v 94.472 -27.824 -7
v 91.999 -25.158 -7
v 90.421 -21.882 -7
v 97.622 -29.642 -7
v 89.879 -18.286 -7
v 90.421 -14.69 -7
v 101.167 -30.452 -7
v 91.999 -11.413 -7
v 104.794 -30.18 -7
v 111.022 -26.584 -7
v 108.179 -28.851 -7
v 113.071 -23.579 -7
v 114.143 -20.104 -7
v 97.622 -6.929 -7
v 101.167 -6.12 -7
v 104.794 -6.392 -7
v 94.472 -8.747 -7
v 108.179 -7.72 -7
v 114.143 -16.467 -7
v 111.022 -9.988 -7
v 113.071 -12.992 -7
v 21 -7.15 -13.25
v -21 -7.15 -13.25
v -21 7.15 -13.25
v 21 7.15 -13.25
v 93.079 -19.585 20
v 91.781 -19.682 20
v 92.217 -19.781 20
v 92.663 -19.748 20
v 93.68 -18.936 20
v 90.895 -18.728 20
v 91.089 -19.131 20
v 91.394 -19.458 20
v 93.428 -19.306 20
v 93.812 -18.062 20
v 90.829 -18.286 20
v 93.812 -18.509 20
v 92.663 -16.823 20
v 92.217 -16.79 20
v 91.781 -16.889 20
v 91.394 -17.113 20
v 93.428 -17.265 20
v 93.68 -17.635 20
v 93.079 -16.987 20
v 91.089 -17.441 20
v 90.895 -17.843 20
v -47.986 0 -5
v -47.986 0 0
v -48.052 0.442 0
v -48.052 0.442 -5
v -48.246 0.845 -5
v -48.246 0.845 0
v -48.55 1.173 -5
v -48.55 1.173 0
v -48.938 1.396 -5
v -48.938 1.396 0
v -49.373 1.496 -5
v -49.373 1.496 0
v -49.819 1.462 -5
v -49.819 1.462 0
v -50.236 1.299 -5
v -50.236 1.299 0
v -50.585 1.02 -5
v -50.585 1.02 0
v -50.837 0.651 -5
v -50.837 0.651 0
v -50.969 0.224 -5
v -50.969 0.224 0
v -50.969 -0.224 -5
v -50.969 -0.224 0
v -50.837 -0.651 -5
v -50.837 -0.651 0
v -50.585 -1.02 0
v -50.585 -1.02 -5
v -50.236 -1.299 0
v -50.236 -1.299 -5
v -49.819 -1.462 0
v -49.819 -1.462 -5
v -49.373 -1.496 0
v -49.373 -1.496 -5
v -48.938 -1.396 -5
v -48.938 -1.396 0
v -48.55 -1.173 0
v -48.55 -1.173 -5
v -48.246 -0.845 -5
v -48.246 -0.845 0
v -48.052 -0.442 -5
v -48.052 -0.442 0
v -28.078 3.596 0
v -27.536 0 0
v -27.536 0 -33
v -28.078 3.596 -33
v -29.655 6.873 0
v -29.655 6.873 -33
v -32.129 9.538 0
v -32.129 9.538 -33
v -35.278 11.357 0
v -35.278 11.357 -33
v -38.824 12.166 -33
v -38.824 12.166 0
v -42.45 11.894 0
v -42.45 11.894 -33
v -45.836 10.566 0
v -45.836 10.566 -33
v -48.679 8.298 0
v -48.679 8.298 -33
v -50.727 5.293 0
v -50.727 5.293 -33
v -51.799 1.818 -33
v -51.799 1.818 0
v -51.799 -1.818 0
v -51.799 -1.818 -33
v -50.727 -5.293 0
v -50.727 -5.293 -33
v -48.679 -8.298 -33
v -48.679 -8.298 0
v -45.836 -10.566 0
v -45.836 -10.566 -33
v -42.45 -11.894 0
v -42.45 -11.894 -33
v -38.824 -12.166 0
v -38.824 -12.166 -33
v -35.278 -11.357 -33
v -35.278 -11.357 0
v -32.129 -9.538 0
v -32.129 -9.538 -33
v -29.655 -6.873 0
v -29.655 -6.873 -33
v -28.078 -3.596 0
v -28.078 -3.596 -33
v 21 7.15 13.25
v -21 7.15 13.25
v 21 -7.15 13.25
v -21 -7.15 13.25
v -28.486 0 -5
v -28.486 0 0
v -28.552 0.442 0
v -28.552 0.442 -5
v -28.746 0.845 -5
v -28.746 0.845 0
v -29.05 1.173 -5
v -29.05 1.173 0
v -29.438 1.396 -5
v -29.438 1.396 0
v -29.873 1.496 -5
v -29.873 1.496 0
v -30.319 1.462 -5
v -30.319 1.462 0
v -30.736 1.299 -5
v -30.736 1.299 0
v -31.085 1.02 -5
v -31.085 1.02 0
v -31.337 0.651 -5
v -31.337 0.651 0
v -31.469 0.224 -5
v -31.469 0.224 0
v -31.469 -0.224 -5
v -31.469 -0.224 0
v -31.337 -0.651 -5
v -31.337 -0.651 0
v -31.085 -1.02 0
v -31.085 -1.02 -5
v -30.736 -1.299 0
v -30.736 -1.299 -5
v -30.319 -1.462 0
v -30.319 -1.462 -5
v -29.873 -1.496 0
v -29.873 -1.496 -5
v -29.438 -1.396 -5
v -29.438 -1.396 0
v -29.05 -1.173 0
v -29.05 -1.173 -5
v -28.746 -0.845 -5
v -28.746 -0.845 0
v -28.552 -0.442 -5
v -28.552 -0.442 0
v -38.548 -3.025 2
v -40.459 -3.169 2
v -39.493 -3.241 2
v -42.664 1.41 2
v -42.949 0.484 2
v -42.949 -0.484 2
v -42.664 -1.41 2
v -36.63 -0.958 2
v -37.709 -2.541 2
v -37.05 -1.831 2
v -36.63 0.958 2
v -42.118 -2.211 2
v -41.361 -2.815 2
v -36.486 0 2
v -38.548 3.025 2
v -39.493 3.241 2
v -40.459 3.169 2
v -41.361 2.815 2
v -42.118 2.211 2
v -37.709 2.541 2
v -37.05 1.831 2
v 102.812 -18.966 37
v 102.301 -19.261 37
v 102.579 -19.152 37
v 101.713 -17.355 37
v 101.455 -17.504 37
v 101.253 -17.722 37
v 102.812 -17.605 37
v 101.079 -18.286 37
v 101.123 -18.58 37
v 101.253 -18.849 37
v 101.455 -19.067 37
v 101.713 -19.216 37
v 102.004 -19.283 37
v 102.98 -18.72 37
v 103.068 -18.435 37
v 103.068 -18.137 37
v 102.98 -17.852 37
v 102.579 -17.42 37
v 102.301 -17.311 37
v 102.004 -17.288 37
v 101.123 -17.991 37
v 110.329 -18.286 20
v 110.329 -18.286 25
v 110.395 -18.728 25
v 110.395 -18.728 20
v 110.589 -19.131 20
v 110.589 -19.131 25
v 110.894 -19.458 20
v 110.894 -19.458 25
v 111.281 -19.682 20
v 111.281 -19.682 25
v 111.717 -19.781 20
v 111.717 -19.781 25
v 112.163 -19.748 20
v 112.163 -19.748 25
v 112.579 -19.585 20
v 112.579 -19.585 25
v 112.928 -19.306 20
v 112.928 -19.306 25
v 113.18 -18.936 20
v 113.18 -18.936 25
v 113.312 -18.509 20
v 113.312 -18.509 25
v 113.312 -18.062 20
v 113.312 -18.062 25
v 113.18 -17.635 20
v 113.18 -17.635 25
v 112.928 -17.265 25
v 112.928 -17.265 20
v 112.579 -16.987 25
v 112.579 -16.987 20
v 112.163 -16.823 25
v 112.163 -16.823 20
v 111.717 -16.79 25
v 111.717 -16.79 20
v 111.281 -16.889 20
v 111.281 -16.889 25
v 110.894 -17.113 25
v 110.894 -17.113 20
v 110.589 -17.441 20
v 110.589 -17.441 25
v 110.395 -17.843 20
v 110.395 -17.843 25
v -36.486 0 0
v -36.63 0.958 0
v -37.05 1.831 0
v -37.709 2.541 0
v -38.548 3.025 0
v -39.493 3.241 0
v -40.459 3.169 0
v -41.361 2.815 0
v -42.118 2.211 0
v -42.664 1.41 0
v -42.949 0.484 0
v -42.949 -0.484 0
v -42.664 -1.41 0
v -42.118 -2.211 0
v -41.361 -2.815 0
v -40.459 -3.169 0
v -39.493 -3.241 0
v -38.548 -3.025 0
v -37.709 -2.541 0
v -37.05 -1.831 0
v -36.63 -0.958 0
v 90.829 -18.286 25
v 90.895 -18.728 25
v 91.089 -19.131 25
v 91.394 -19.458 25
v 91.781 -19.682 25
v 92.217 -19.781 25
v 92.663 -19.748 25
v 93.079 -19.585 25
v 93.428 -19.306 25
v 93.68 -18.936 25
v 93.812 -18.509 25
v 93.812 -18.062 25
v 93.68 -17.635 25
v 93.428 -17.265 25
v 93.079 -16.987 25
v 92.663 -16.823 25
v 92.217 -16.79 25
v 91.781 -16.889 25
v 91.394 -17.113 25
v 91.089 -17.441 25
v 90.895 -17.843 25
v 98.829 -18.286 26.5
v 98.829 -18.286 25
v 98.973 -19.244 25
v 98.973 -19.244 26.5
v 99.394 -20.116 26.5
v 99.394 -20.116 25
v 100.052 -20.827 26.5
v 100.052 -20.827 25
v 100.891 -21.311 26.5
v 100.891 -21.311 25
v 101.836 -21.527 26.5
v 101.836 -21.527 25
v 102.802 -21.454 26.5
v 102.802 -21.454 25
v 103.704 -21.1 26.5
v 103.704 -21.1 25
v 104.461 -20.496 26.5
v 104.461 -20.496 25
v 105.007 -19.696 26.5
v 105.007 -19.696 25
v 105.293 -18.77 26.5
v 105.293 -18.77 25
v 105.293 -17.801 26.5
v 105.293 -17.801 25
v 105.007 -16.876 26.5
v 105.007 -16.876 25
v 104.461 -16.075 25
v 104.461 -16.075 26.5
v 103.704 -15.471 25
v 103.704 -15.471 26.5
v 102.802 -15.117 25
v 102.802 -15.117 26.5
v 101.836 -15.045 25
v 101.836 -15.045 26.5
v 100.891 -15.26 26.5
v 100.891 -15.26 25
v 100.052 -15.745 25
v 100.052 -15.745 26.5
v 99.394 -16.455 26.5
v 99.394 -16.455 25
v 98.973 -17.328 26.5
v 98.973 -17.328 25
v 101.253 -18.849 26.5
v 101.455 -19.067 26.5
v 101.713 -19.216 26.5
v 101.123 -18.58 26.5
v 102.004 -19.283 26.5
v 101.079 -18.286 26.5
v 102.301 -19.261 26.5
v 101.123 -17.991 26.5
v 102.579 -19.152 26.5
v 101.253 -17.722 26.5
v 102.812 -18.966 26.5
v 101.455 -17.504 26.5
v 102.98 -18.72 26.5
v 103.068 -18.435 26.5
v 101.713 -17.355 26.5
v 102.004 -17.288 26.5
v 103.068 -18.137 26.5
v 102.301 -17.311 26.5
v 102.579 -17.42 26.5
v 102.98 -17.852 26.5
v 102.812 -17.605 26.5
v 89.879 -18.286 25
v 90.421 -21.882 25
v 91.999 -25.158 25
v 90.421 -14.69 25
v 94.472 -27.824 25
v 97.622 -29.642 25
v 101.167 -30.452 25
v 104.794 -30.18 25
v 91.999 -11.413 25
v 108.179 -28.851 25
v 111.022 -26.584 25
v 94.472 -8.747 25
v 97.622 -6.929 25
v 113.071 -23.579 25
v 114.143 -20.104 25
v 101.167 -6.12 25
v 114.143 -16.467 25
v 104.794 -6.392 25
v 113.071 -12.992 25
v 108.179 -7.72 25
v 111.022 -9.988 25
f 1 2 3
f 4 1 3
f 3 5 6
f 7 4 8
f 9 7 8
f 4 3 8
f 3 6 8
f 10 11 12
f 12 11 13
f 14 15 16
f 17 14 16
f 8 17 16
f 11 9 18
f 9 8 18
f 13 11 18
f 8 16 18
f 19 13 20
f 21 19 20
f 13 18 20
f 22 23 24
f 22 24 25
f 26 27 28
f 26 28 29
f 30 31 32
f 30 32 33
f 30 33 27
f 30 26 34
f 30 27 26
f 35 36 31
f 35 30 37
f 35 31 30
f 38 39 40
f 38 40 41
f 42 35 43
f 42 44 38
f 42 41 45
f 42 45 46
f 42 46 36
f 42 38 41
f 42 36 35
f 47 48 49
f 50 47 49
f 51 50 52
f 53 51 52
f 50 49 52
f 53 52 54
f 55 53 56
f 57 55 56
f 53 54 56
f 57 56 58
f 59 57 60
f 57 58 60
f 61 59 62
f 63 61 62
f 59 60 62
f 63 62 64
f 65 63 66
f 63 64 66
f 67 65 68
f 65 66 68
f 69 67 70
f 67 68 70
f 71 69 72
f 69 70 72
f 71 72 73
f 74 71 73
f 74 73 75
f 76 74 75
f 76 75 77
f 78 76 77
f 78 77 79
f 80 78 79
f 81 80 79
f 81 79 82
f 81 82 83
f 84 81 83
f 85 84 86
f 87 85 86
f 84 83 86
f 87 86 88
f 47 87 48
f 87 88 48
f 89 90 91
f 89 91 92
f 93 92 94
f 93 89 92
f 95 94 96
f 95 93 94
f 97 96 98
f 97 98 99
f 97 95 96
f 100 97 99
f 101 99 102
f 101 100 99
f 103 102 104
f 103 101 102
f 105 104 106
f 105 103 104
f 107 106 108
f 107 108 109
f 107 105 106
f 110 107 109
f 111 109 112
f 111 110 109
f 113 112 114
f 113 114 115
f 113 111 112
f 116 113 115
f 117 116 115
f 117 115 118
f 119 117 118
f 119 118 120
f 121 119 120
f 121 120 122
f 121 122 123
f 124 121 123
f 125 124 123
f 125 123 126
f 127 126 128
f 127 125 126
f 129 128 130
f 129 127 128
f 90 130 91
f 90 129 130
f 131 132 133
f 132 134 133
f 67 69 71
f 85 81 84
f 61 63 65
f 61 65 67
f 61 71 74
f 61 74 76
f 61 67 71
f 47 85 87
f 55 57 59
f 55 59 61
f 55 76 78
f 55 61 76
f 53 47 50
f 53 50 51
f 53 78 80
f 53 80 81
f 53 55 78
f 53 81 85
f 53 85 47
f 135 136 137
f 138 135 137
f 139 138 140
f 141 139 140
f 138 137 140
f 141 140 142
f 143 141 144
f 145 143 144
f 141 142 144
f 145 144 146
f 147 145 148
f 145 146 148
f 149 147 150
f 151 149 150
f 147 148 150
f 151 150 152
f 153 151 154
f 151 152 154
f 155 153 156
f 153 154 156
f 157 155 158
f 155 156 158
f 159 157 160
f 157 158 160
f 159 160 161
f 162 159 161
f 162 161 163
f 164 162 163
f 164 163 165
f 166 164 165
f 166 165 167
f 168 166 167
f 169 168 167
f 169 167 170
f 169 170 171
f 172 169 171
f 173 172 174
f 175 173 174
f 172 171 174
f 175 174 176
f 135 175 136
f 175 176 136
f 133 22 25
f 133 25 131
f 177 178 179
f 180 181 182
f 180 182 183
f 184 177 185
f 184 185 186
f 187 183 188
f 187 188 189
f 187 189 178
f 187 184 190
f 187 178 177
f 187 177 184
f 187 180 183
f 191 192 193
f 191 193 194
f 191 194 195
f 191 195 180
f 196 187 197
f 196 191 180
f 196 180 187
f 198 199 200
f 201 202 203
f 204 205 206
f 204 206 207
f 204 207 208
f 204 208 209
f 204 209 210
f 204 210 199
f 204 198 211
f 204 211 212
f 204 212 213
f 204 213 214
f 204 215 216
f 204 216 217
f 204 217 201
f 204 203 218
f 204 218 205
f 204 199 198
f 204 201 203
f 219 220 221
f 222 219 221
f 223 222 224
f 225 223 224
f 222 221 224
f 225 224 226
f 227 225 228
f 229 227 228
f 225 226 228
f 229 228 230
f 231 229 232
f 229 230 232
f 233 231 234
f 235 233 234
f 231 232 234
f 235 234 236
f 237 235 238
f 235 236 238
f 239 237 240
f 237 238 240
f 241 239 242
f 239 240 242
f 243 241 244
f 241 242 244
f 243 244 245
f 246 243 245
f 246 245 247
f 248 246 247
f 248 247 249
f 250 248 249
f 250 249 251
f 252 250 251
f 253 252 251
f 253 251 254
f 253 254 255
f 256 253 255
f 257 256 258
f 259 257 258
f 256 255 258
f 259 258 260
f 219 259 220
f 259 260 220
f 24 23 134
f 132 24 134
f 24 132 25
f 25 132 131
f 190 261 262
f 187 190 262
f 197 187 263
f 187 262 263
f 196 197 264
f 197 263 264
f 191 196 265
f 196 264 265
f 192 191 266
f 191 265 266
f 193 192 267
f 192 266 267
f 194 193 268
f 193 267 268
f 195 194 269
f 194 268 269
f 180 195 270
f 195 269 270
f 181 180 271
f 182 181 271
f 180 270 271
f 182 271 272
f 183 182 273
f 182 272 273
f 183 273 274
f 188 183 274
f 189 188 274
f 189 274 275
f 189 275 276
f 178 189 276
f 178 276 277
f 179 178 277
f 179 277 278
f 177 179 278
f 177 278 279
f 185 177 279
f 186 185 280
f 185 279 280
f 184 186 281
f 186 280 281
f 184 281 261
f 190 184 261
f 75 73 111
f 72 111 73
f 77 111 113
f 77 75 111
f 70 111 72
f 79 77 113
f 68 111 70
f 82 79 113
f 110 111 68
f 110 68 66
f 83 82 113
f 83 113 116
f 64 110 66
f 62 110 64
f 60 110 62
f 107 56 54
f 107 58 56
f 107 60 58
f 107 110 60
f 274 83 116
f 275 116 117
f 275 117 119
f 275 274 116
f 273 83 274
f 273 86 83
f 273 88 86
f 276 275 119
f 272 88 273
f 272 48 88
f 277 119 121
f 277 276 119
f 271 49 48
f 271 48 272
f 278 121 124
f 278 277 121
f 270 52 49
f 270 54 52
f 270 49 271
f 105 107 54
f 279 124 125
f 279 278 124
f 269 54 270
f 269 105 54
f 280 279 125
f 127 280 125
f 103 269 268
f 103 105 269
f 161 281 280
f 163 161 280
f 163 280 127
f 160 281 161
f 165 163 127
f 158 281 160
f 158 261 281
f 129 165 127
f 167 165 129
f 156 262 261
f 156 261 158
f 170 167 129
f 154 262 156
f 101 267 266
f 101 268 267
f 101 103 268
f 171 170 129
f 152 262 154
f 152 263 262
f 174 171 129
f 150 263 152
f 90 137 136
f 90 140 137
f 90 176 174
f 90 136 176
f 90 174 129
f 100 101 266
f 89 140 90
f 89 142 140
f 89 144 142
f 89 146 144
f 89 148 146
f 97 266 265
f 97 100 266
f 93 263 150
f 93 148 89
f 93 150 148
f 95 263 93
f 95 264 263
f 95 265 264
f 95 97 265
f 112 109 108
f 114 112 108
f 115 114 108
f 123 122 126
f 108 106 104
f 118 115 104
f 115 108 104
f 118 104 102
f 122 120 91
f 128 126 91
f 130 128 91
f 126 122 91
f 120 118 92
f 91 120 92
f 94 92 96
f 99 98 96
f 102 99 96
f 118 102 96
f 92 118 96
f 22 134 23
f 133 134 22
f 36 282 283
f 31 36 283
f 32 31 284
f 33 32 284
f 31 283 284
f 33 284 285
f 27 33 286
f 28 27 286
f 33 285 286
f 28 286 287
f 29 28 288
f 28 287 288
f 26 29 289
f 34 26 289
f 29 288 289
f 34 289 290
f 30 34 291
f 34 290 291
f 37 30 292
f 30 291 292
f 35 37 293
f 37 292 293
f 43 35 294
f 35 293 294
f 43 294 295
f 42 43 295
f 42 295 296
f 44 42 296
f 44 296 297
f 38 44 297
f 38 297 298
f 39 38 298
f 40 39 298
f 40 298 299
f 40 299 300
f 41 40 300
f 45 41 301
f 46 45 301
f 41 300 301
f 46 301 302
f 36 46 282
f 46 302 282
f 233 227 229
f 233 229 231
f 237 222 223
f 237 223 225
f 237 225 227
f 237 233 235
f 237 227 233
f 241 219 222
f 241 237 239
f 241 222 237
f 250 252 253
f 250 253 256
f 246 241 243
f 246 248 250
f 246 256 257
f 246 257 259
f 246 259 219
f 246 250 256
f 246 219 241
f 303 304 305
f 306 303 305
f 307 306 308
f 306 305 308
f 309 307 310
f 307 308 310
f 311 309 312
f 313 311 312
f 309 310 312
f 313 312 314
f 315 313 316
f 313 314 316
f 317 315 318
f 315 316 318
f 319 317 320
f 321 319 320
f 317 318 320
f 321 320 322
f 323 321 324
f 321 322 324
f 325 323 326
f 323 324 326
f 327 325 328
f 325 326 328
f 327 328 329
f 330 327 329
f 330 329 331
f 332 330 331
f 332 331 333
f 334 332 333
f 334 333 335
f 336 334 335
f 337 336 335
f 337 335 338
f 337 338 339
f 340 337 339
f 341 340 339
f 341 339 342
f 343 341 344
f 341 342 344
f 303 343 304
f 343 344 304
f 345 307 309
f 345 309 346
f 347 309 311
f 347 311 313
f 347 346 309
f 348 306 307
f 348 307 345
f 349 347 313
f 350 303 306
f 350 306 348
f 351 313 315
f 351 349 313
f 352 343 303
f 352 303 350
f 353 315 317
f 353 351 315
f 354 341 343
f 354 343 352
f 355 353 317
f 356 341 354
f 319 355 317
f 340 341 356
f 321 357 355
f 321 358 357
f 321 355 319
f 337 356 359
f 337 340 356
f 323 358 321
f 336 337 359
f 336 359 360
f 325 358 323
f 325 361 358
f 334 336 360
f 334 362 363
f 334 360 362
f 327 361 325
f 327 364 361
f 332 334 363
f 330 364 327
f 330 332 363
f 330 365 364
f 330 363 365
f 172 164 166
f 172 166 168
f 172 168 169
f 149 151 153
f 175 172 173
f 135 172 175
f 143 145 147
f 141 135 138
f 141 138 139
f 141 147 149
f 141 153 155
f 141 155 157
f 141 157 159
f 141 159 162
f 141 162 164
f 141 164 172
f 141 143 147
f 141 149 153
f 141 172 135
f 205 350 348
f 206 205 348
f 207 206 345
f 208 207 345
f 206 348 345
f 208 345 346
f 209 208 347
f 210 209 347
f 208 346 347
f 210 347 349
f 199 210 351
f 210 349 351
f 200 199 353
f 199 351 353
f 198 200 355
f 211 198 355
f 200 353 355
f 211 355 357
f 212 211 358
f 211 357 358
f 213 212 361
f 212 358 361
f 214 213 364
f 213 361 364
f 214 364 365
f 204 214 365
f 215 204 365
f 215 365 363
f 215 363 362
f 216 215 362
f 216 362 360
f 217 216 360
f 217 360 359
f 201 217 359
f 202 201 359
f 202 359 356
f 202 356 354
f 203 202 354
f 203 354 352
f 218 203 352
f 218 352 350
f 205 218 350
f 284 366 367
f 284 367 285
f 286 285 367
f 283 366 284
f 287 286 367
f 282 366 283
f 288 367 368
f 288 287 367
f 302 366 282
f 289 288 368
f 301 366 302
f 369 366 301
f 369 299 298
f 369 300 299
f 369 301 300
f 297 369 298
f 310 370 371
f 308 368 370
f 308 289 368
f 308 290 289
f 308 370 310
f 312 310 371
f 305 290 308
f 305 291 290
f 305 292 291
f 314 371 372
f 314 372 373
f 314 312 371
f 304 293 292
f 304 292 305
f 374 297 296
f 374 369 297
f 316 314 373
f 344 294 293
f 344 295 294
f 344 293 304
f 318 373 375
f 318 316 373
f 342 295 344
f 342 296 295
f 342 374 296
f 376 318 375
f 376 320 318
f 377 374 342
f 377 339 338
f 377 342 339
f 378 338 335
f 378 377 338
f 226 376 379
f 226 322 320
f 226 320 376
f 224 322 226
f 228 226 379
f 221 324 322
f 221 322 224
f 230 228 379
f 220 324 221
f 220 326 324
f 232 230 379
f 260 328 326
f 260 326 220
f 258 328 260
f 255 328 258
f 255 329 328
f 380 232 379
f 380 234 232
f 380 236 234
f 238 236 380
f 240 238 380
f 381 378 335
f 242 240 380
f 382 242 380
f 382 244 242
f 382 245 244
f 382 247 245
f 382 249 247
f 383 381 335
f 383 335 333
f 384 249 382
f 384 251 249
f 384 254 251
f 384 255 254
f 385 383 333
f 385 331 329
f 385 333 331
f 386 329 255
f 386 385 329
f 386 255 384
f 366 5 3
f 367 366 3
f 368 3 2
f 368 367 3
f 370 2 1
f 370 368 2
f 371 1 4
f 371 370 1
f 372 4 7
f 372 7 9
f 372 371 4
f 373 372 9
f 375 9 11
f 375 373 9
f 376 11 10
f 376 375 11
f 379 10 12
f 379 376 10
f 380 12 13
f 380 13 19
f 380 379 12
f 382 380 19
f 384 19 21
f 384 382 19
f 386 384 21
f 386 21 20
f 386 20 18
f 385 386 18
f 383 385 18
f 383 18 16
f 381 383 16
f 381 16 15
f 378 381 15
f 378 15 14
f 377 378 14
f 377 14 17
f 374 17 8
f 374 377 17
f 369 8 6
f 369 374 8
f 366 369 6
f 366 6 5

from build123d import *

# Parameters (mm, degrees)
F0_W      = 42
F0_H      = 26.5
F1_DEPTH  = 7.15
F3_R      = 12.2
F3_R_2    = 1.5
F3_R_3    = 3.25
F3_R_4    = 1
F4_DEPTH  = 33
F5_DEPTH  = 2
F7_DEPTH  = 5
F10_DEPTH = 32
F11_DEPTH = 5
F12_DEPTH = 1.5
F13_DEPTH = 12


# Not quite as in the source:
# - the program builds the solid bodies; features that only make, move or delete a surface that nothing else refers to are left out


with BuildPart() as f1:
    # F0 (on Front) → F1 (new body, symmetric)
    with BuildSketch(Plane.XZ):
        Rectangle(F0_W, F0_H)
    extrude(amount=F1_DEPTH, both=True)


with BuildPart() as f4:
    # F3 (on Top) → F4 (new body)
    with BuildSketch(Plane.XY):
        with Locations((-39.7355780005, 0)):
            Circle(F3_R)
        with Locations((-49.4855780005, 0)):
            Circle(F3_R_2, mode=Mode.SUBTRACT)
        with Locations((-39.7355780005, 0)):
            Circle(F3_R_3, mode=Mode.SUBTRACT)
        with Locations((-29.9855780005, 0)):
            Circle(F3_R_2, mode=Mode.SUBTRACT)
        with Locations((-39.7355780005, 0)):
            Circle(F3_R_3)
        with Locations((-39.7355780005, 0)):
            Circle(F3_R_4, mode=Mode.SUBTRACT)
        with Locations((-49.4855780005, 0)):
            Circle(F3_R_2)
        with Locations((-29.9855780005, 0)):
            Circle(F3_R_2)
        with Locations((-39.7355780005, 0)):
            Circle(F3_R_4)
    extrude(amount=-F4_DEPTH)

    # F3 (on Top) → F5 (join)
    with BuildSketch(Plane.XY):
        with Locations((-39.7355780005, 0)):
            Circle(F3_R_3)
        with Locations((-39.7355780005, 0)):
            Circle(F3_R_4, mode=Mode.SUBTRACT)
        with Locations((-39.7355780005, 0)):
            Circle(F3_R_4)
    extrude(amount=F5_DEPTH)

    # F3 (on Top) → F7 (cut)
    with BuildSketch(Plane.XY):
        with Locations((-49.4855780005, 0)):
            Circle(F3_R_2)
        with Locations((-29.9855780005, 0)):
            Circle(F3_R_2)
    extrude(amount=-F7_DEPTH, mode=Mode.SUBTRACT)


with BuildPart() as f10:
    # F9 (on offset) → F10 (new body)
    with BuildSketch(Plane.XY.offset(25)):
        with BuildLine():
            Line((113.3288017511, -18.2856229367), (114.2788017511, -18.2856229367))
            ThreePointArc((114.2788017511, -18.2856229367), (102.0788017511, -6.0856229367), (89.8788017511, -18.2856229367))
            Line((89.8788017511, -18.2856229367), (90.8288017511, -18.2856229367))
            ThreePointArc((90.8288017511, -18.2856229367), (92.3288017511, -16.7856229367), (93.8288017511, -18.2856229367))
            Line((93.8288017511, -18.2856229367), (98.8288017511, -18.2856229367))
            ThreePointArc((98.8288017511, -18.2856229367), (102.0788017511, -15.0356229367), (105.3288017511, -18.2856229367))
            Line((105.3288017511, -18.2856229367), (110.3288017511, -18.2856229367))
            ThreePointArc((110.3288017511, -18.2856229367), (111.8288017511, -16.7856229367), (113.3288017511, -18.2856229367))
        make_face()
        with BuildLine():
            ThreePointArc((89.8788017511, -18.2856229367), (102.0788017511, -30.4856229367), (114.2788017511, -18.2856229367))
            Line((114.2788017511, -18.2856229367), (113.3288017511, -18.2856229367))
            ThreePointArc((113.3288017511, -18.2856229367), (111.8288017511, -19.7856229367), (110.3288017511, -18.2856229367))
            Line((110.3288017511, -18.2856229367), (105.3288017511, -18.2856229367))
            ThreePointArc((105.3288017511, -18.2856229367), (102.0788017511, -21.5356229367), (98.8288017511, -18.2856229367))
            Line((98.8288017511, -18.2856229367), (93.8288017511, -18.2856229367))
            ThreePointArc((93.8288017511, -18.2856229367), (92.3288017511, -19.7856229367), (90.8288017511, -18.2856229367))
            Line((90.8288017511, -18.2856229367), (89.8788017511, -18.2856229367))
        make_face()
        with BuildLine():
            Line((110.3288017511, -18.2856229367), (113.3288017511, -18.2856229367))
            ThreePointArc((113.3288017511, -18.2856229367), (111.8288017511, -16.7856229367), (110.3288017511, -18.2856229367))
        make_face()
        with BuildLine():
            ThreePointArc((110.3288017511, -18.2856229367), (111.8288017511, -19.7856229367), (113.3288017511, -18.2856229367))
            Line((113.3288017511, -18.2856229367), (110.3288017511, -18.2856229367))
        make_face()
        with BuildLine():
            Line((103.0788017511, -18.2856229367), (105.3288017511, -18.2856229367))
            ThreePointArc((105.3288017511, -18.2856229367), (102.0788017511, -15.0356229367), (98.8288017511, -18.2856229367))
            Line((98.8288017511, -18.2856229367), (101.0788017511, -18.2856229367))
            ThreePointArc((101.0788017511, -18.2856229367), (102.0788017511, -17.2856229367), (103.0788017511, -18.2856229367))
        make_face()
        with BuildLine():
            ThreePointArc((98.8288017511, -18.2856229367), (102.0788017511, -21.5356229367), (105.3288017511, -18.2856229367))
            Line((105.3288017511, -18.2856229367), (103.0788017511, -18.2856229367))
            ThreePointArc((103.0788017511, -18.2856229367), (102.0788017511, -19.2856229367), (101.0788017511, -18.2856229367))
            Line((101.0788017511, -18.2856229367), (98.8288017511, -18.2856229367))
        make_face()
        with BuildLine():
            Line((101.0788017511, -18.2856229367), (103.0788017511, -18.2856229367))
            ThreePointArc((103.0788017511, -18.2856229367), (102.0788017511, -17.2856229367), (101.0788017511, -18.2856229367))
        make_face()
        with BuildLine():
            ThreePointArc((101.0788017511, -18.2856229367), (102.0788017511, -19.2856229367), (103.0788017511, -18.2856229367))
            Line((103.0788017511, -18.2856229367), (101.0788017511, -18.2856229367))
        make_face()
        with BuildLine():
            ThreePointArc((93.8288017511, -18.2856229367), (92.3288017511, -16.7856229367), (90.8288017511, -18.2856229367))
            Line((90.8288017511, -18.2856229367), (93.8288017511, -18.2856229367))
        make_face()
        with BuildLine():
            Line((93.8288017511, -18.2856229367), (90.8288017511, -18.2856229367))
            ThreePointArc((90.8288017511, -18.2856229367), (92.3288017511, -19.7856229367), (93.8288017511, -18.2856229367))
        make_face()
    extrude(amount=-F10_DEPTH)

    # F9 (on offset) → F11 (cut)
    with BuildSketch(Plane.XY.offset(25)):
        with BuildLine():
            ThreePointArc((93.8288017511, -18.2856229367), (92.3288017511, -16.7856229367), (90.8288017511, -18.2856229367))
            Line((90.8288017511, -18.2856229367), (93.8288017511, -18.2856229367))
        make_face()
        with BuildLine():
            Line((93.8288017511, -18.2856229367), (90.8288017511, -18.2856229367))
            ThreePointArc((90.8288017511, -18.2856229367), (92.3288017511, -19.7856229367), (93.8288017511, -18.2856229367))
        make_face()
        with BuildLine():
            Line((110.3288017511, -18.2856229367), (113.3288017511, -18.2856229367))
            ThreePointArc((113.3288017511, -18.2856229367), (111.8288017511, -16.7856229367), (110.3288017511, -18.2856229367))
        make_face()
        with BuildLine():
            ThreePointArc((110.3288017511, -18.2856229367), (111.8288017511, -19.7856229367), (113.3288017511, -18.2856229367))
            Line((113.3288017511, -18.2856229367), (110.3288017511, -18.2856229367))
        make_face()
    extrude(amount=-F11_DEPTH, mode=Mode.SUBTRACT)

    # F9 (on offset) → F12 (join)
    with BuildSketch(Plane.XY.offset(25)):
        with BuildLine():
            Line((103.0788017511, -18.2856229367), (105.3288017511, -18.2856229367))
            ThreePointArc((105.3288017511, -18.2856229367), (102.0788017511, -15.0356229367), (98.8288017511, -18.2856229367))
            Line((98.8288017511, -18.2856229367), (101.0788017511, -18.2856229367))
            ThreePointArc((101.0788017511, -18.2856229367), (102.0788017511, -17.2856229367), (103.0788017511, -18.2856229367))
        make_face()
        with BuildLine():
            ThreePointArc((98.8288017511, -18.2856229367), (102.0788017511, -21.5356229367), (105.3288017511, -18.2856229367))
            Line((105.3288017511, -18.2856229367), (103.0788017511, -18.2856229367))
            ThreePointArc((103.0788017511, -18.2856229367), (102.0788017511, -19.2856229367), (101.0788017511, -18.2856229367))
            Line((101.0788017511, -18.2856229367), (98.8288017511, -18.2856229367))
        make_face()
    extrude(amount=F12_DEPTH)

    # F9 (on offset) → F13 (join)
    with BuildSketch(Plane.XY.offset(25)):
        with BuildLine():
            Line((101.0788017511, -18.2856229367), (103.0788017511, -18.2856229367))
            ThreePointArc((103.0788017511, -18.2856229367), (102.0788017511, -17.2856229367), (101.0788017511, -18.2856229367))
        make_face()
        with BuildLine():
            ThreePointArc((101.0788017511, -18.2856229367), (102.0788017511, -19.2856229367), (103.0788017511, -18.2856229367))
            Line((103.0788017511, -18.2856229367), (101.0788017511, -18.2856229367))
        make_face()
    extrude(amount=F13_DEPTH)


solid = Compound([f1.part, f4.part, f10.part])
